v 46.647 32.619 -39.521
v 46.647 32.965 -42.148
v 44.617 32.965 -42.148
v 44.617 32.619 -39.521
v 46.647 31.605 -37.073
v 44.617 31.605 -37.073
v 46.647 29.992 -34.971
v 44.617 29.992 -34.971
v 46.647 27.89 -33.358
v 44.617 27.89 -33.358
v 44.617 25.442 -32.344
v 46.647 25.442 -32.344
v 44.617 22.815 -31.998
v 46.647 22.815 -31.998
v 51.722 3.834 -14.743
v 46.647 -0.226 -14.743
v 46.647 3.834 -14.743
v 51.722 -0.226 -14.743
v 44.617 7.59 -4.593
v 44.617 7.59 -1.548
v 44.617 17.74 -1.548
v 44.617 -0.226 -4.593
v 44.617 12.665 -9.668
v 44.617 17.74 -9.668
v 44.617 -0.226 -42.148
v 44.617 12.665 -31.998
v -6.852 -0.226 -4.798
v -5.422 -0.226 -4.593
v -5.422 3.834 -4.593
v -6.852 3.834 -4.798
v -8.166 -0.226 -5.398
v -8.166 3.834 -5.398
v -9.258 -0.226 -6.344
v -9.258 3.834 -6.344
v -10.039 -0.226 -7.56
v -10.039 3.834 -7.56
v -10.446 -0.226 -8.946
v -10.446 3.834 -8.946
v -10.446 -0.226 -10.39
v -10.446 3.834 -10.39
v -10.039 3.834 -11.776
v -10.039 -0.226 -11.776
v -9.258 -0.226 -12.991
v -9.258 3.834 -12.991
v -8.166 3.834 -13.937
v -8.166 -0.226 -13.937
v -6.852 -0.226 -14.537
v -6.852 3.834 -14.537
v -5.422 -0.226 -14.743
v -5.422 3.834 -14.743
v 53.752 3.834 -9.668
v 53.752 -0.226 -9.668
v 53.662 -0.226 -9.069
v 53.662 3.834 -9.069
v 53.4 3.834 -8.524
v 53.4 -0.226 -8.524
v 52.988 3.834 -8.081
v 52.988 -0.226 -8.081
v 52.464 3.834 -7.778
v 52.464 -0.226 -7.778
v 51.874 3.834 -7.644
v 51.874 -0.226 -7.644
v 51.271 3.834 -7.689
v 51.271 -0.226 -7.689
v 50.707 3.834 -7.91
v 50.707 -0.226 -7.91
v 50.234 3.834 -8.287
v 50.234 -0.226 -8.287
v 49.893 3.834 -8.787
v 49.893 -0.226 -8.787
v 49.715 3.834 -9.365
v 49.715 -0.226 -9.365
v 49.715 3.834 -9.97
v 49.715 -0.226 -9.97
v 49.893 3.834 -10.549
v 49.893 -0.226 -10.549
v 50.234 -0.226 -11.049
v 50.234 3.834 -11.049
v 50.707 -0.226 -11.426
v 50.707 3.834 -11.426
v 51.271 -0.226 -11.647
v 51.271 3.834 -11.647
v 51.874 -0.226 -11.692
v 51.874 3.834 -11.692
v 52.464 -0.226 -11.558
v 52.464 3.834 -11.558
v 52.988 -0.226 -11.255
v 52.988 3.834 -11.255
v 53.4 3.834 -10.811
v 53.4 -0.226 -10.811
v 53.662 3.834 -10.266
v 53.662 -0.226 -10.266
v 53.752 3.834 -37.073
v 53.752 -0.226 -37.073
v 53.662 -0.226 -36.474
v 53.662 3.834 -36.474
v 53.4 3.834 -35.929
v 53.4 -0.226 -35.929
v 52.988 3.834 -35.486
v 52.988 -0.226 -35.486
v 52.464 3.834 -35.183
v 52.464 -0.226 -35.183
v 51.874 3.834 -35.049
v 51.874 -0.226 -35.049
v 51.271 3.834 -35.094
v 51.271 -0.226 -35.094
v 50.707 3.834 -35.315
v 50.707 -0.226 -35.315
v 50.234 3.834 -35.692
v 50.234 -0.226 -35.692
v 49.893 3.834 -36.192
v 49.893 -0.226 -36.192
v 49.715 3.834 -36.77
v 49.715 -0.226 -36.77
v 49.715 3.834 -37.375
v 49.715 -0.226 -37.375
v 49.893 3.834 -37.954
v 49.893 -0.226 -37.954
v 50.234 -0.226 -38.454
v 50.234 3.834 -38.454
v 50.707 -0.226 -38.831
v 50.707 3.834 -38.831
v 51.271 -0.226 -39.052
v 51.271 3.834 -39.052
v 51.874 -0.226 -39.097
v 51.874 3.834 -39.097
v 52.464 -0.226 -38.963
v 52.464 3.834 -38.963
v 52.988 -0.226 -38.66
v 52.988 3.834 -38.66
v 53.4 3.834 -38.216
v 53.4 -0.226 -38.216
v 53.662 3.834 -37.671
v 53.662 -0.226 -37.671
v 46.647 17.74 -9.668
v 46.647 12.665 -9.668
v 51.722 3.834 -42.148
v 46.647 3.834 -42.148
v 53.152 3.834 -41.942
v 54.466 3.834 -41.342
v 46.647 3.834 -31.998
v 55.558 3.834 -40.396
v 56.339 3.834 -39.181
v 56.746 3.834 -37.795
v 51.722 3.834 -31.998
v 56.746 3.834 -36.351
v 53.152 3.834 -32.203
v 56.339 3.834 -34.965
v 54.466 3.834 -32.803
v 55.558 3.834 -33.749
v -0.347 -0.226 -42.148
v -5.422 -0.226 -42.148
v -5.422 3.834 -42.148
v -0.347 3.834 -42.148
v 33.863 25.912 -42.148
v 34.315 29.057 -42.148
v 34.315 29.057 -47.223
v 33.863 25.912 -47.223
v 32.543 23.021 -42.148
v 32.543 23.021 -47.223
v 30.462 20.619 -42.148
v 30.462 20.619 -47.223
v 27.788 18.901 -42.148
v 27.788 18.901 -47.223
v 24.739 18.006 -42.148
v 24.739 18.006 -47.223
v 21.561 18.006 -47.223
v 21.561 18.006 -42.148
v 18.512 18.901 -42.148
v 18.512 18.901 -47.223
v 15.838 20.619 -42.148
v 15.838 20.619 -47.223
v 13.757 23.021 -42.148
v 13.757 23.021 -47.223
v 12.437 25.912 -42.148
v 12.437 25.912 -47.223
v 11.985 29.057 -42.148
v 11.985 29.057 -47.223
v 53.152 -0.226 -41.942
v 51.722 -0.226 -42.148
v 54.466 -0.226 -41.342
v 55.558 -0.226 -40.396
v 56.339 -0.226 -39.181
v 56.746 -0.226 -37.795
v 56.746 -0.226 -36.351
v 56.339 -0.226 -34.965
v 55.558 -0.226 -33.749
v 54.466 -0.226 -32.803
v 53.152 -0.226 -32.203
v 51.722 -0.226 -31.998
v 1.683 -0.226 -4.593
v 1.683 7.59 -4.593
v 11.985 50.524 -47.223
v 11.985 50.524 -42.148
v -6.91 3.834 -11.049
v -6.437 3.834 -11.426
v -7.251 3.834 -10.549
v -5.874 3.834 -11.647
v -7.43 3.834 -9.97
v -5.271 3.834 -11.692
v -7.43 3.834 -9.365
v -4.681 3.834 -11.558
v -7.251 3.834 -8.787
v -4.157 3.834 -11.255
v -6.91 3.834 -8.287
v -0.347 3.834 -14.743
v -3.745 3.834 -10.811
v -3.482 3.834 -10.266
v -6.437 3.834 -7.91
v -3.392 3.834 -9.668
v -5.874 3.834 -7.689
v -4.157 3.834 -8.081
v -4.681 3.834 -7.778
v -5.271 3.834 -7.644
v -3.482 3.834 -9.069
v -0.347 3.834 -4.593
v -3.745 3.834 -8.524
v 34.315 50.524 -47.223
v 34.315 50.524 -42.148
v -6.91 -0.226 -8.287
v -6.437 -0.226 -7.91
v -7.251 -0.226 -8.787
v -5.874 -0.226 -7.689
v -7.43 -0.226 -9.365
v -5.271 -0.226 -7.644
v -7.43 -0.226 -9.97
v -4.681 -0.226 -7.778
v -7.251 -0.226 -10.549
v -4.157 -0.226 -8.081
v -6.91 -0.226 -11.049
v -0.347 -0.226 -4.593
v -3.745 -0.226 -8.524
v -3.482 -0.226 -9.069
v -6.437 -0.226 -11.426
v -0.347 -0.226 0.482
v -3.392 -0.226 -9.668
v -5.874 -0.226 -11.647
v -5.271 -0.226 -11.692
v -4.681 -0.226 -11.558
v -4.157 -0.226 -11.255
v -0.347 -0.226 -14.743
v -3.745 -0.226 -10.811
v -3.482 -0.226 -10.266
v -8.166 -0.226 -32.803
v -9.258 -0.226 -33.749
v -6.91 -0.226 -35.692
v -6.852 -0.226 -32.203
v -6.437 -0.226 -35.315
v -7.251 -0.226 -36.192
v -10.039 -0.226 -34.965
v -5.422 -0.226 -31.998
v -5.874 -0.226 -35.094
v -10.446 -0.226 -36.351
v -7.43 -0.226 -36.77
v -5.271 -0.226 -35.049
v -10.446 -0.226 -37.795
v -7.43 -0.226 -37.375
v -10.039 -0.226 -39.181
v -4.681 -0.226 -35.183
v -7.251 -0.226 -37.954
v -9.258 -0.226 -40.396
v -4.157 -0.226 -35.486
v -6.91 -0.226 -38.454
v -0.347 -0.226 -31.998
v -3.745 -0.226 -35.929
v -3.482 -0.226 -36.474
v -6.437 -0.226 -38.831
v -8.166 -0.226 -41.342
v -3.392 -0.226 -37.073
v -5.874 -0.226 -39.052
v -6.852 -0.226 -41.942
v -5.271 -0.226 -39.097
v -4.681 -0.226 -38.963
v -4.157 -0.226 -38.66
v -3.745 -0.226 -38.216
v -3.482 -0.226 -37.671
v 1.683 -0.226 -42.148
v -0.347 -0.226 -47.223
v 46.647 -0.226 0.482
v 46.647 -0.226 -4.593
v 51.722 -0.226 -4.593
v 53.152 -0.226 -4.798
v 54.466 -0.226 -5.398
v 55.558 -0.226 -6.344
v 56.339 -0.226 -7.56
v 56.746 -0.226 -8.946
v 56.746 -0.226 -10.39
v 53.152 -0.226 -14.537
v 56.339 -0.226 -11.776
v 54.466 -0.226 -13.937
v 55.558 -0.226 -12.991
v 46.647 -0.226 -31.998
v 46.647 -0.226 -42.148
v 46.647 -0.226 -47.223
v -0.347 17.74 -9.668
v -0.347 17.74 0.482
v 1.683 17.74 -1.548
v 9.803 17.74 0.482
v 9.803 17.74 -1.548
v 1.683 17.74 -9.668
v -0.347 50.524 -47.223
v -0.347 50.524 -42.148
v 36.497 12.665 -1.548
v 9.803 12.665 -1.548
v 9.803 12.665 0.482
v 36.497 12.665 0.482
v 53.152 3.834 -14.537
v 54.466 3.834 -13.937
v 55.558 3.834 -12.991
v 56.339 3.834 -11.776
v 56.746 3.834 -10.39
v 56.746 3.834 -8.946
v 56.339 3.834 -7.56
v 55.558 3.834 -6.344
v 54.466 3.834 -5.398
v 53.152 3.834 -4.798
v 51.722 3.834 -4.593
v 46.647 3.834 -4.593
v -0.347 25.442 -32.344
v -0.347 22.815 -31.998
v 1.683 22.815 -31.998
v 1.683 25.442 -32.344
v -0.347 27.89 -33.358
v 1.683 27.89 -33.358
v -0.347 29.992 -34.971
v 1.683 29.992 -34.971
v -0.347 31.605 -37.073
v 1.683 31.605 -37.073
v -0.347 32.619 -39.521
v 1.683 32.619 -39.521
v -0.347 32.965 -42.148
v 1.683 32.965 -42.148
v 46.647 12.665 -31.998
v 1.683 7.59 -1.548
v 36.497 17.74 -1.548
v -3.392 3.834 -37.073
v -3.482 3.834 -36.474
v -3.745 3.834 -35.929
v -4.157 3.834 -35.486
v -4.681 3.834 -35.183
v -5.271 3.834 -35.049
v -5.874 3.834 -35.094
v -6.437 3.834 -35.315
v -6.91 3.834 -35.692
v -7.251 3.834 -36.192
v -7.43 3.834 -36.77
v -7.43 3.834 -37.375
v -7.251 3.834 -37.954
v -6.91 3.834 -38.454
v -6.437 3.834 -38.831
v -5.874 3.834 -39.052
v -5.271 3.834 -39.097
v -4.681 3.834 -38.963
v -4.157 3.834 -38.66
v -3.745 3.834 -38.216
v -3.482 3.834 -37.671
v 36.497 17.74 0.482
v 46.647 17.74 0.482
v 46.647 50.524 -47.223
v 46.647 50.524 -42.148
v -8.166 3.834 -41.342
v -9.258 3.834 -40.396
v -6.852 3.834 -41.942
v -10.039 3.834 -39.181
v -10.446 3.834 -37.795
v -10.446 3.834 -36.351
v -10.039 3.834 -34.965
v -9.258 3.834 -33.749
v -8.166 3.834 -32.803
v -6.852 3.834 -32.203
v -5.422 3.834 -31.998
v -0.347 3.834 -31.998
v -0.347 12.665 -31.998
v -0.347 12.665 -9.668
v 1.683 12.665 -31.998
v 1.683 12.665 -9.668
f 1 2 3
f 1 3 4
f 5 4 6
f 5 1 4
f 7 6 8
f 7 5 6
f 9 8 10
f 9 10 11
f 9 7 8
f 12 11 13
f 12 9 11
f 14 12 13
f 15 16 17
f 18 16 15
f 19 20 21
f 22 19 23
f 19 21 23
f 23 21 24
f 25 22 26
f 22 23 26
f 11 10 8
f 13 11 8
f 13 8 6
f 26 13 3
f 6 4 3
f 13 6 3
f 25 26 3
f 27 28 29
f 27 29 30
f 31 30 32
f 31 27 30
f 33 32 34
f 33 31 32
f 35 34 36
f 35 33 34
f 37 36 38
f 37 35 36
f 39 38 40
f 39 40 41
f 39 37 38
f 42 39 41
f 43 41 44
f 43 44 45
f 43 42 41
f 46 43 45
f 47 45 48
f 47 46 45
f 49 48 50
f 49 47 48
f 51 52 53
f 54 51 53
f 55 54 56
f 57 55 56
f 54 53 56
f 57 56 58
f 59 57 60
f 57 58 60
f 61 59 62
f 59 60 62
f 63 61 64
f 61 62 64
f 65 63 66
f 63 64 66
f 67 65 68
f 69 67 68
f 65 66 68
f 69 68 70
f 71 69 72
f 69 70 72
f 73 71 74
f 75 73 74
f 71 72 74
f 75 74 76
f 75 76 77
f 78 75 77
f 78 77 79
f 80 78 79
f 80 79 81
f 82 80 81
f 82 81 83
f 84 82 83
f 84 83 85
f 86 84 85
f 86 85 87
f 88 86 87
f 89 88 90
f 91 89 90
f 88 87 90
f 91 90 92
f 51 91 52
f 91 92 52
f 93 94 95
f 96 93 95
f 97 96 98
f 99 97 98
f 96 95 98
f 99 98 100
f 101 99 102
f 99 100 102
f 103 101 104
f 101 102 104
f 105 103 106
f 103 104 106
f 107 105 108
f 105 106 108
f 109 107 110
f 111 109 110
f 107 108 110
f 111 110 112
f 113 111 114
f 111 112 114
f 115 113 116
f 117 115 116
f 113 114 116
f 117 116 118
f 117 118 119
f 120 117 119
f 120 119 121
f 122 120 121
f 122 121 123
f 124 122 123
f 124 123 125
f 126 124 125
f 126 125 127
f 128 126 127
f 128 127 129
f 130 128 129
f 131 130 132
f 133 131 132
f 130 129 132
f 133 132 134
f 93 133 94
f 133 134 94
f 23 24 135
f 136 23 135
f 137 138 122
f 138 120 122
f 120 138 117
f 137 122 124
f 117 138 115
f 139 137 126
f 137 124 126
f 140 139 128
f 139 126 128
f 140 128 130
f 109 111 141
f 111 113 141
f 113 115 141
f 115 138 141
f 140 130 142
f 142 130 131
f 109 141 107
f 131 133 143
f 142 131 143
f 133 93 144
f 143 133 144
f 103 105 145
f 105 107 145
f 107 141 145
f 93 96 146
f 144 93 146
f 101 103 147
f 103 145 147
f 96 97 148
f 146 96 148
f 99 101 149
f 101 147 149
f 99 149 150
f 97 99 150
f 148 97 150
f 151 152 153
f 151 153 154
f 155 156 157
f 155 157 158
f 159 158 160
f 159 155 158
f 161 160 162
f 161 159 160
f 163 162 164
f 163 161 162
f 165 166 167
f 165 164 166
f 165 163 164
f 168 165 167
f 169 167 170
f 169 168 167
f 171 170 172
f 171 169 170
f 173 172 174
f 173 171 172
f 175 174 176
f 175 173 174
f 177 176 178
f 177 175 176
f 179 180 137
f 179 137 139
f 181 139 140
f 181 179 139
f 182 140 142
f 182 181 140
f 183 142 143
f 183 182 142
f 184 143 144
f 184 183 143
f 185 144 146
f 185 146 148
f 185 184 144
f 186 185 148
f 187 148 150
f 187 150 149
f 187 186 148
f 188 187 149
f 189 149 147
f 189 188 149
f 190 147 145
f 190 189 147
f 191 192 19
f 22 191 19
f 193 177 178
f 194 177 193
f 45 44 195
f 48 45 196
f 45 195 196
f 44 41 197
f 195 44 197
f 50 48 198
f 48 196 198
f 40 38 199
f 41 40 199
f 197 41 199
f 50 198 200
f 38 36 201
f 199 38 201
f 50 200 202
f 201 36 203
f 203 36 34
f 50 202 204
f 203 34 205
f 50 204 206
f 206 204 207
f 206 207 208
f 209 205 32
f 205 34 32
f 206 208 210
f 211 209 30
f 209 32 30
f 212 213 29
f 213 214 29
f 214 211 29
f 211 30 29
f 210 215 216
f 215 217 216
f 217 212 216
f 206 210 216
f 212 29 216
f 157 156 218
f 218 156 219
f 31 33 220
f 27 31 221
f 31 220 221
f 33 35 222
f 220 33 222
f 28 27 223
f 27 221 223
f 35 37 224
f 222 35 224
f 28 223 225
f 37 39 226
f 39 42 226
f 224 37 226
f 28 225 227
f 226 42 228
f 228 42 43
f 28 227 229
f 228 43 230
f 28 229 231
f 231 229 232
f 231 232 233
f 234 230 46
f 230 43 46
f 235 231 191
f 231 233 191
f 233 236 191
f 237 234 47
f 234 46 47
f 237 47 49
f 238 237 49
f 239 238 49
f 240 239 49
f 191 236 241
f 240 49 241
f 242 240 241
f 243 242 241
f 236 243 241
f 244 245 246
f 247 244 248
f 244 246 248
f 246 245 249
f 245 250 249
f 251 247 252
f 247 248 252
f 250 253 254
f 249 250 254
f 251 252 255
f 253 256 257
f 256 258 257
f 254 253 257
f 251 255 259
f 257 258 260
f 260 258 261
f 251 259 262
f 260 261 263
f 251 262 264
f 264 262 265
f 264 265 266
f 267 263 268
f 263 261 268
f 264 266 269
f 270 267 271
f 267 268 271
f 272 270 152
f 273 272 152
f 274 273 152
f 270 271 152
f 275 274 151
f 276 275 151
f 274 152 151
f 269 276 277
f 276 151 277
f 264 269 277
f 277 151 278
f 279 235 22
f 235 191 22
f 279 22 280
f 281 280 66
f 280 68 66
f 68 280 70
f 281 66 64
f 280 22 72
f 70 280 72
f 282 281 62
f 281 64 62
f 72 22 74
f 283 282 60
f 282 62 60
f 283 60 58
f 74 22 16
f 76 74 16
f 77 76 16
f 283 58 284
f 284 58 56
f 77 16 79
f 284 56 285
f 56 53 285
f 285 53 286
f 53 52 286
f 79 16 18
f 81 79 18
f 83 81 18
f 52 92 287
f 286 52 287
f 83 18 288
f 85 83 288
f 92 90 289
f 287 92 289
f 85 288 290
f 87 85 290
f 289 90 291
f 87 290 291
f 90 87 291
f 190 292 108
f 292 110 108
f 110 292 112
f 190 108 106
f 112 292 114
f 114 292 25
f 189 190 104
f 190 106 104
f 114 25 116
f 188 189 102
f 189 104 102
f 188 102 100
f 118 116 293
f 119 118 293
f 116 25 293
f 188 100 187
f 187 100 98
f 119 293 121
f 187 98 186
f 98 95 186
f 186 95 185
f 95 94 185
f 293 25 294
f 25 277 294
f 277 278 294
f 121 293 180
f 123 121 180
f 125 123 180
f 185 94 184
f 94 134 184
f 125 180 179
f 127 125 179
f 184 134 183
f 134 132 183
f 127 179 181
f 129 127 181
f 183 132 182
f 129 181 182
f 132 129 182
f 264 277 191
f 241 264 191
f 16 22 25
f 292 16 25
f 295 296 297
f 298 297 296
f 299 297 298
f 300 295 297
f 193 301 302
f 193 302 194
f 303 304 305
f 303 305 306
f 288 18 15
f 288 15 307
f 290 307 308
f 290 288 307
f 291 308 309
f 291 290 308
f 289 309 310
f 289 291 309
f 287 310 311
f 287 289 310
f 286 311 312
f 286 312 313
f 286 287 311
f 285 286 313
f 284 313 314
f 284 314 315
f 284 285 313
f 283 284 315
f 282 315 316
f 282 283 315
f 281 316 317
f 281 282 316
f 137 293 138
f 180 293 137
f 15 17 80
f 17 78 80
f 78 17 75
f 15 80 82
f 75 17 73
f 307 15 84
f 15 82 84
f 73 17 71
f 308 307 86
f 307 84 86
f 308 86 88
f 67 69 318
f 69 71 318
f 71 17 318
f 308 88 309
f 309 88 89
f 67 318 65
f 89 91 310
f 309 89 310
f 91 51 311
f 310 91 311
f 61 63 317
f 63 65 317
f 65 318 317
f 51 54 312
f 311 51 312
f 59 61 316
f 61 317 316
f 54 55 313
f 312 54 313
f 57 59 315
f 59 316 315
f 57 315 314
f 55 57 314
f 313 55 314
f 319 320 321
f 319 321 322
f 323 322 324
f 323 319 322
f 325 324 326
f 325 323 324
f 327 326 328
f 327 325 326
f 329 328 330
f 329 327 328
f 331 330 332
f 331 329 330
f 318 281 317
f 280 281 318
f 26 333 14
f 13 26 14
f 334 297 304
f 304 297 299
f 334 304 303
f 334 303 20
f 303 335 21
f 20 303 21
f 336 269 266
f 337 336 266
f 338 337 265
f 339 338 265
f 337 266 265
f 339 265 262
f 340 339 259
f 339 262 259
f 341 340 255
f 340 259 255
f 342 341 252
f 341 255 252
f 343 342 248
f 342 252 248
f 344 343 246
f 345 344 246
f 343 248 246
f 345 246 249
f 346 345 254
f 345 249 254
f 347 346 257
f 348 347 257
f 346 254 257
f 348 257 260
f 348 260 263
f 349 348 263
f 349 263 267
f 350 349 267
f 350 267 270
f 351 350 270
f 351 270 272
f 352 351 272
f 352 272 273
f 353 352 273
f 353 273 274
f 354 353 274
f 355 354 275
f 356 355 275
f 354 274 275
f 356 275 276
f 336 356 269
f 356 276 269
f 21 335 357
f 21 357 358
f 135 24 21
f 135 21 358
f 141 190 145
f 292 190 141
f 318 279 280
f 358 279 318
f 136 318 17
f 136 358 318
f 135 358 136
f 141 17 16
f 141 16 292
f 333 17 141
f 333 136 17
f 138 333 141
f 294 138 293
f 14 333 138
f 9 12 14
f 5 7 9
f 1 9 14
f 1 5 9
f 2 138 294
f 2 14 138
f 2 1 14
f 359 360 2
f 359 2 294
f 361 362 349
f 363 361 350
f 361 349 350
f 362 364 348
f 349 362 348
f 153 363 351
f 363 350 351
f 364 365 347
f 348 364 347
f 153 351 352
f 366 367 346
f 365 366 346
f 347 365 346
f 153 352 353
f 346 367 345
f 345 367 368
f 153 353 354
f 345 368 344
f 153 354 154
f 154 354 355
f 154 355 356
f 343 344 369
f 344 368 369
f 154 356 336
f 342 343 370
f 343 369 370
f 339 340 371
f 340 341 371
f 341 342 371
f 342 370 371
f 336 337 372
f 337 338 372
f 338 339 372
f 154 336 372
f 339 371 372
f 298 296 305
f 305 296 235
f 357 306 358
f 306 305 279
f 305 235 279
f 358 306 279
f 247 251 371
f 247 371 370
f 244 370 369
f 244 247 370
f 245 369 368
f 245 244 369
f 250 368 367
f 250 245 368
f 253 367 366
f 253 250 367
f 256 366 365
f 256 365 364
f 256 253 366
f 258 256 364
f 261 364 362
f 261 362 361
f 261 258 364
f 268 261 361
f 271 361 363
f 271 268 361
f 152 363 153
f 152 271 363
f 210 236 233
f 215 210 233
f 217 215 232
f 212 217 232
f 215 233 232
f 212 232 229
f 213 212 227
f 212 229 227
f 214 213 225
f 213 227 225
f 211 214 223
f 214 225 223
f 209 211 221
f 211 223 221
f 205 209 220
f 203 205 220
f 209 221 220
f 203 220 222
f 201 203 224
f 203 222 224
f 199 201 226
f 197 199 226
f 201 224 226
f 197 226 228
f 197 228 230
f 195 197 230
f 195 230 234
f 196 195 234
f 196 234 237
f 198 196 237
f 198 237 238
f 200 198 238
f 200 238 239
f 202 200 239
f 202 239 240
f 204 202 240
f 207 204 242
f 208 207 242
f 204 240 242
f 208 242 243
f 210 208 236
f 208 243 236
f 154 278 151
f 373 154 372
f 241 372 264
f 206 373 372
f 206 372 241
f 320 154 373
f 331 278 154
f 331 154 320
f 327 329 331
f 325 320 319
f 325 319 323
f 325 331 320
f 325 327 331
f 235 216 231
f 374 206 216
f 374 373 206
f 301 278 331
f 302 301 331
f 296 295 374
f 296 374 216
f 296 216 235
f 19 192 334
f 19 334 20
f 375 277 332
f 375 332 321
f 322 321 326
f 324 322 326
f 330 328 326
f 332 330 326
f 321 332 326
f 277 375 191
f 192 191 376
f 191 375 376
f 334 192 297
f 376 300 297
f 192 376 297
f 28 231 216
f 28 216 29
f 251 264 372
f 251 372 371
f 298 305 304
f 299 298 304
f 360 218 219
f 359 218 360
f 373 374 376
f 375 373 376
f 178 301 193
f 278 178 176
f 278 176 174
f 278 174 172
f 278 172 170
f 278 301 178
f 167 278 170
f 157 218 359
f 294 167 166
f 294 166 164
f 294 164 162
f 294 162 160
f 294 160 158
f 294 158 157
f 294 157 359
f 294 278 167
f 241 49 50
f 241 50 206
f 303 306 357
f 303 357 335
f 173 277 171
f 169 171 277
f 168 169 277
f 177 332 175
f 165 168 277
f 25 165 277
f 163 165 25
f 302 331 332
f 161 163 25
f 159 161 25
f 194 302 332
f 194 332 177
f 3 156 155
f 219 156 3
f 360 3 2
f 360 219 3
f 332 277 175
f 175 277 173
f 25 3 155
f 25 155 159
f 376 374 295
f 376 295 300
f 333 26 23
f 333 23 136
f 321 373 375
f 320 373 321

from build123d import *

# Parameters (mm, degrees)
SKETCH_1_W          = 46.3
SKETCH_1_H          = 47
EXTRUDE_1_DEPTH     = 50
SKETCH_2_W          = 46.3
SKETCH_2_H          = 42
CUT_EXTRUDE_1_DEPTH = 32.3
SKETCH_3_W          = 42.3
SKETCH_3_H          = 40
CUT_EXTRUDE_2_DEPTH = 10
SKETCH_4_W          = 42.3
SKETCH_4_H          = 37
CUT_EXTRUDE_3_DEPTH = 8.7
SKETCH_5_W          = 2
SKETCH_5_H          = 22
SKETCH_5_W_2        = 26.3
SKETCH_5_H_2        = 2
CUT_EXTRUDE_4_DEPTH = 5
SKETCH_7_W          = 10
SKETCH_7_H          = 5
EXTRUDE_2_DEPTH     = 2
SKETCH_8_W          = 10
SKETCH_8_H          = 5
EXTRUDE_3_DEPTH     = 2
SKETCH_9_W          = 22
SKETCH_9_H          = 21.15
CUT_EXTRUDE_5_DEPTH = 6
SKETCH_11_R         = 2
EXTRUDE_4_DEPTH     = 4
SKETCH_12_R         = 2
CUT_EXTRUDE_6_DEPTH = 4
SCALE_1_SCALE       = 1.015


with BuildPart() as part:
    # 草圖1 → 填料-伸長1 (new body)
    with BuildSketch(Plane(origin=(0, 0, 0), x_dir=(1, 0, 0), z_dir=(0, 1, 0))):
        with Locations((23.15, 23.5)):
            Rectangle(SKETCH_1_W, SKETCH_1_H)
    extrude(amount=EXTRUDE_1_DEPTH)

    # 草圖2 → 除料-伸長1 (cut)
    with BuildSketch(Plane(origin=(0, 50, 0), x_dir=(1, 0, 0), z_dir=(0, 1, 0))):
        with Locations((23.15, 21)):
            Rectangle(SKETCH_2_W, SKETCH_2_H)
    extrude(amount=-CUT_EXTRUDE_1_DEPTH, mode=Mode.SUBTRACT)

    # 草圖3 → 除料-伸長2 (cut)
    with BuildSketch(Plane(origin=(0, 17.7, 0), x_dir=(1, 0, 0), z_dir=(0, 1, 0))):
        with Locations((23.15, 22)):
            Rectangle(SKETCH_3_W, SKETCH_3_H)
    extrude(amount=-CUT_EXTRUDE_2_DEPTH, mode=Mode.SUBTRACT)

    # 草圖4 → 除料-伸長3 (cut, through all)
    with BuildSketch(Plane(origin=(0, 7.7, 0), x_dir=(1, 0, 0), z_dir=(0, 1, 0))):
        with Locations((23.15, 23.5)):
            Rectangle(SKETCH_4_W, SKETCH_4_H)
    extrude(amount=-CUT_EXTRUDE_3_DEPTH, mode=Mode.SUBTRACT)

    # 草圖5 → 除料-伸長4 (cut)
    with BuildSketch(Plane(origin=(0, 17.7, 0), x_dir=(1, 0, 0), z_dir=(0, 1, 0))):
        with Locations((1, 21)):
            Rectangle(SKETCH_5_W, SKETCH_5_H)
        with Locations((45.3, 21)):
            Rectangle(SKETCH_5_W, SKETCH_5_H)
        with Locations((23.15, 1)):
            Rectangle(SKETCH_5_W_2, SKETCH_5_H_2)
    extrude(amount=-CUT_EXTRUDE_4_DEPTH, mode=Mode.SUBTRACT)

    # 草圖7 → 填料-伸長2 (add)
    with BuildSketch(Plane.ZY):
        with BuildLine():
            Line((-42, 32.7), (-42, 22.7))
            Line((-42, 22.7), (-32, 22.7))
            ThreePointArc((-32, 22.7), (-34.928932188, 29.771067812), (-42, 32.7))
        make_face()
        with Locations((-37, 20.2)):
            Rectangle(SKETCH_7_W, SKETCH_7_H)
    extrude(amount=-EXTRUDE_2_DEPTH)

    # 草圖8 → 填料-伸長3 (add)
    with BuildSketch(Plane(origin=(46.3, 0, 0), x_dir=(0, 0, -1), z_dir=(1, 0, 0))):
        with Locations((37, 20.2)):
            Rectangle(SKETCH_8_W, SKETCH_8_H)
        with BuildLine():
            Line((32, 22.7), (42, 22.7))
            Line((42, 22.7), (42, 32.7))
            ThreePointArc((42, 32.7), (34.928932188, 29.771067812), (32, 22.7))
        make_face()
    extrude(amount=-EXTRUDE_3_DEPTH)

    # 草圖9 → 除料-伸長5 (cut, through all)
    with BuildSketch(Plane.XY.offset(-42)):
        with BuildLine():
            ThreePointArc((34.15, 28.85), (23.15, 17.85), (12.15, 28.85))
            Line((12.15, 28.85), (34.15, 28.85))
        make_face()
        with Locations((23.15, 39.425)):
            Rectangle(SKETCH_9_W, SKETCH_9_H)
    extrude(amount=-CUT_EXTRUDE_5_DEPTH, mode=Mode.SUBTRACT)

    # 草圖11 → 填料-伸長4 (add)
    with BuildSketch(Plane.XZ):
        with BuildLine():
            Line((51.3, -5), (46.3, -5))
            Line((46.3, -5), (46.3, -15))
            Line((46.3, -15), (51.3, -15))
            ThreePointArc((51.3, -15), (56.3, -10), (51.3, -5))
        make_face()
        with Locations((51.3, -10)):
            Circle(SKETCH_11_R, mode=Mode.SUBTRACT)
        with BuildLine():
            Line((46.3, -32), (46.3, -42))
            Line((46.3, -42), (51.3, -42))
            ThreePointArc((51.3, -42), (56.3, -37), (51.3, -32))
            Line((51.3, -32), (46.3, -32))
        make_face()
        with Locations((51.3, -37)):
            Circle(SKETCH_11_R, mode=Mode.SUBTRACT)
        with BuildLine():
            Line((0, -15), (0, -5))
            Line((0, -5), (-5, -5))
            ThreePointArc((-5, -5), (-10, -10), (-5, -15))
            Line((-5, -15), (0, -15))
        make_face()
        with BuildLine():
            Line((0, -42), (0, -32))
            Line((0, -32), (-5, -32))
            ThreePointArc((-5, -32), (-10, -37), (-5, -42))
            Line((-5, -42), (0, -42))
        make_face()
        with Locations((-5, -37)):
            Circle(SKETCH_11_R, mode=Mode.SUBTRACT)
    extrude(amount=-EXTRUDE_4_DEPTH)

    # 草圖12 → 除料-伸長6 (cut)
    with BuildSketch(Plane.XZ):
        with Locations((-5, -10)):
            Circle(SKETCH_12_R)
    extrude(amount=-CUT_EXTRUDE_6_DEPTH, mode=Mode.SUBTRACT)


with BuildPart() as part_1:
    # 縮放比例1: scaled about (23.15, 15.034187995, -32.143313771)
    add(part.part.scale(SCALE_1_SCALE).moved(Location((-0.34725, -0.22551282, 0.482149707))))


solid = part_1.part
